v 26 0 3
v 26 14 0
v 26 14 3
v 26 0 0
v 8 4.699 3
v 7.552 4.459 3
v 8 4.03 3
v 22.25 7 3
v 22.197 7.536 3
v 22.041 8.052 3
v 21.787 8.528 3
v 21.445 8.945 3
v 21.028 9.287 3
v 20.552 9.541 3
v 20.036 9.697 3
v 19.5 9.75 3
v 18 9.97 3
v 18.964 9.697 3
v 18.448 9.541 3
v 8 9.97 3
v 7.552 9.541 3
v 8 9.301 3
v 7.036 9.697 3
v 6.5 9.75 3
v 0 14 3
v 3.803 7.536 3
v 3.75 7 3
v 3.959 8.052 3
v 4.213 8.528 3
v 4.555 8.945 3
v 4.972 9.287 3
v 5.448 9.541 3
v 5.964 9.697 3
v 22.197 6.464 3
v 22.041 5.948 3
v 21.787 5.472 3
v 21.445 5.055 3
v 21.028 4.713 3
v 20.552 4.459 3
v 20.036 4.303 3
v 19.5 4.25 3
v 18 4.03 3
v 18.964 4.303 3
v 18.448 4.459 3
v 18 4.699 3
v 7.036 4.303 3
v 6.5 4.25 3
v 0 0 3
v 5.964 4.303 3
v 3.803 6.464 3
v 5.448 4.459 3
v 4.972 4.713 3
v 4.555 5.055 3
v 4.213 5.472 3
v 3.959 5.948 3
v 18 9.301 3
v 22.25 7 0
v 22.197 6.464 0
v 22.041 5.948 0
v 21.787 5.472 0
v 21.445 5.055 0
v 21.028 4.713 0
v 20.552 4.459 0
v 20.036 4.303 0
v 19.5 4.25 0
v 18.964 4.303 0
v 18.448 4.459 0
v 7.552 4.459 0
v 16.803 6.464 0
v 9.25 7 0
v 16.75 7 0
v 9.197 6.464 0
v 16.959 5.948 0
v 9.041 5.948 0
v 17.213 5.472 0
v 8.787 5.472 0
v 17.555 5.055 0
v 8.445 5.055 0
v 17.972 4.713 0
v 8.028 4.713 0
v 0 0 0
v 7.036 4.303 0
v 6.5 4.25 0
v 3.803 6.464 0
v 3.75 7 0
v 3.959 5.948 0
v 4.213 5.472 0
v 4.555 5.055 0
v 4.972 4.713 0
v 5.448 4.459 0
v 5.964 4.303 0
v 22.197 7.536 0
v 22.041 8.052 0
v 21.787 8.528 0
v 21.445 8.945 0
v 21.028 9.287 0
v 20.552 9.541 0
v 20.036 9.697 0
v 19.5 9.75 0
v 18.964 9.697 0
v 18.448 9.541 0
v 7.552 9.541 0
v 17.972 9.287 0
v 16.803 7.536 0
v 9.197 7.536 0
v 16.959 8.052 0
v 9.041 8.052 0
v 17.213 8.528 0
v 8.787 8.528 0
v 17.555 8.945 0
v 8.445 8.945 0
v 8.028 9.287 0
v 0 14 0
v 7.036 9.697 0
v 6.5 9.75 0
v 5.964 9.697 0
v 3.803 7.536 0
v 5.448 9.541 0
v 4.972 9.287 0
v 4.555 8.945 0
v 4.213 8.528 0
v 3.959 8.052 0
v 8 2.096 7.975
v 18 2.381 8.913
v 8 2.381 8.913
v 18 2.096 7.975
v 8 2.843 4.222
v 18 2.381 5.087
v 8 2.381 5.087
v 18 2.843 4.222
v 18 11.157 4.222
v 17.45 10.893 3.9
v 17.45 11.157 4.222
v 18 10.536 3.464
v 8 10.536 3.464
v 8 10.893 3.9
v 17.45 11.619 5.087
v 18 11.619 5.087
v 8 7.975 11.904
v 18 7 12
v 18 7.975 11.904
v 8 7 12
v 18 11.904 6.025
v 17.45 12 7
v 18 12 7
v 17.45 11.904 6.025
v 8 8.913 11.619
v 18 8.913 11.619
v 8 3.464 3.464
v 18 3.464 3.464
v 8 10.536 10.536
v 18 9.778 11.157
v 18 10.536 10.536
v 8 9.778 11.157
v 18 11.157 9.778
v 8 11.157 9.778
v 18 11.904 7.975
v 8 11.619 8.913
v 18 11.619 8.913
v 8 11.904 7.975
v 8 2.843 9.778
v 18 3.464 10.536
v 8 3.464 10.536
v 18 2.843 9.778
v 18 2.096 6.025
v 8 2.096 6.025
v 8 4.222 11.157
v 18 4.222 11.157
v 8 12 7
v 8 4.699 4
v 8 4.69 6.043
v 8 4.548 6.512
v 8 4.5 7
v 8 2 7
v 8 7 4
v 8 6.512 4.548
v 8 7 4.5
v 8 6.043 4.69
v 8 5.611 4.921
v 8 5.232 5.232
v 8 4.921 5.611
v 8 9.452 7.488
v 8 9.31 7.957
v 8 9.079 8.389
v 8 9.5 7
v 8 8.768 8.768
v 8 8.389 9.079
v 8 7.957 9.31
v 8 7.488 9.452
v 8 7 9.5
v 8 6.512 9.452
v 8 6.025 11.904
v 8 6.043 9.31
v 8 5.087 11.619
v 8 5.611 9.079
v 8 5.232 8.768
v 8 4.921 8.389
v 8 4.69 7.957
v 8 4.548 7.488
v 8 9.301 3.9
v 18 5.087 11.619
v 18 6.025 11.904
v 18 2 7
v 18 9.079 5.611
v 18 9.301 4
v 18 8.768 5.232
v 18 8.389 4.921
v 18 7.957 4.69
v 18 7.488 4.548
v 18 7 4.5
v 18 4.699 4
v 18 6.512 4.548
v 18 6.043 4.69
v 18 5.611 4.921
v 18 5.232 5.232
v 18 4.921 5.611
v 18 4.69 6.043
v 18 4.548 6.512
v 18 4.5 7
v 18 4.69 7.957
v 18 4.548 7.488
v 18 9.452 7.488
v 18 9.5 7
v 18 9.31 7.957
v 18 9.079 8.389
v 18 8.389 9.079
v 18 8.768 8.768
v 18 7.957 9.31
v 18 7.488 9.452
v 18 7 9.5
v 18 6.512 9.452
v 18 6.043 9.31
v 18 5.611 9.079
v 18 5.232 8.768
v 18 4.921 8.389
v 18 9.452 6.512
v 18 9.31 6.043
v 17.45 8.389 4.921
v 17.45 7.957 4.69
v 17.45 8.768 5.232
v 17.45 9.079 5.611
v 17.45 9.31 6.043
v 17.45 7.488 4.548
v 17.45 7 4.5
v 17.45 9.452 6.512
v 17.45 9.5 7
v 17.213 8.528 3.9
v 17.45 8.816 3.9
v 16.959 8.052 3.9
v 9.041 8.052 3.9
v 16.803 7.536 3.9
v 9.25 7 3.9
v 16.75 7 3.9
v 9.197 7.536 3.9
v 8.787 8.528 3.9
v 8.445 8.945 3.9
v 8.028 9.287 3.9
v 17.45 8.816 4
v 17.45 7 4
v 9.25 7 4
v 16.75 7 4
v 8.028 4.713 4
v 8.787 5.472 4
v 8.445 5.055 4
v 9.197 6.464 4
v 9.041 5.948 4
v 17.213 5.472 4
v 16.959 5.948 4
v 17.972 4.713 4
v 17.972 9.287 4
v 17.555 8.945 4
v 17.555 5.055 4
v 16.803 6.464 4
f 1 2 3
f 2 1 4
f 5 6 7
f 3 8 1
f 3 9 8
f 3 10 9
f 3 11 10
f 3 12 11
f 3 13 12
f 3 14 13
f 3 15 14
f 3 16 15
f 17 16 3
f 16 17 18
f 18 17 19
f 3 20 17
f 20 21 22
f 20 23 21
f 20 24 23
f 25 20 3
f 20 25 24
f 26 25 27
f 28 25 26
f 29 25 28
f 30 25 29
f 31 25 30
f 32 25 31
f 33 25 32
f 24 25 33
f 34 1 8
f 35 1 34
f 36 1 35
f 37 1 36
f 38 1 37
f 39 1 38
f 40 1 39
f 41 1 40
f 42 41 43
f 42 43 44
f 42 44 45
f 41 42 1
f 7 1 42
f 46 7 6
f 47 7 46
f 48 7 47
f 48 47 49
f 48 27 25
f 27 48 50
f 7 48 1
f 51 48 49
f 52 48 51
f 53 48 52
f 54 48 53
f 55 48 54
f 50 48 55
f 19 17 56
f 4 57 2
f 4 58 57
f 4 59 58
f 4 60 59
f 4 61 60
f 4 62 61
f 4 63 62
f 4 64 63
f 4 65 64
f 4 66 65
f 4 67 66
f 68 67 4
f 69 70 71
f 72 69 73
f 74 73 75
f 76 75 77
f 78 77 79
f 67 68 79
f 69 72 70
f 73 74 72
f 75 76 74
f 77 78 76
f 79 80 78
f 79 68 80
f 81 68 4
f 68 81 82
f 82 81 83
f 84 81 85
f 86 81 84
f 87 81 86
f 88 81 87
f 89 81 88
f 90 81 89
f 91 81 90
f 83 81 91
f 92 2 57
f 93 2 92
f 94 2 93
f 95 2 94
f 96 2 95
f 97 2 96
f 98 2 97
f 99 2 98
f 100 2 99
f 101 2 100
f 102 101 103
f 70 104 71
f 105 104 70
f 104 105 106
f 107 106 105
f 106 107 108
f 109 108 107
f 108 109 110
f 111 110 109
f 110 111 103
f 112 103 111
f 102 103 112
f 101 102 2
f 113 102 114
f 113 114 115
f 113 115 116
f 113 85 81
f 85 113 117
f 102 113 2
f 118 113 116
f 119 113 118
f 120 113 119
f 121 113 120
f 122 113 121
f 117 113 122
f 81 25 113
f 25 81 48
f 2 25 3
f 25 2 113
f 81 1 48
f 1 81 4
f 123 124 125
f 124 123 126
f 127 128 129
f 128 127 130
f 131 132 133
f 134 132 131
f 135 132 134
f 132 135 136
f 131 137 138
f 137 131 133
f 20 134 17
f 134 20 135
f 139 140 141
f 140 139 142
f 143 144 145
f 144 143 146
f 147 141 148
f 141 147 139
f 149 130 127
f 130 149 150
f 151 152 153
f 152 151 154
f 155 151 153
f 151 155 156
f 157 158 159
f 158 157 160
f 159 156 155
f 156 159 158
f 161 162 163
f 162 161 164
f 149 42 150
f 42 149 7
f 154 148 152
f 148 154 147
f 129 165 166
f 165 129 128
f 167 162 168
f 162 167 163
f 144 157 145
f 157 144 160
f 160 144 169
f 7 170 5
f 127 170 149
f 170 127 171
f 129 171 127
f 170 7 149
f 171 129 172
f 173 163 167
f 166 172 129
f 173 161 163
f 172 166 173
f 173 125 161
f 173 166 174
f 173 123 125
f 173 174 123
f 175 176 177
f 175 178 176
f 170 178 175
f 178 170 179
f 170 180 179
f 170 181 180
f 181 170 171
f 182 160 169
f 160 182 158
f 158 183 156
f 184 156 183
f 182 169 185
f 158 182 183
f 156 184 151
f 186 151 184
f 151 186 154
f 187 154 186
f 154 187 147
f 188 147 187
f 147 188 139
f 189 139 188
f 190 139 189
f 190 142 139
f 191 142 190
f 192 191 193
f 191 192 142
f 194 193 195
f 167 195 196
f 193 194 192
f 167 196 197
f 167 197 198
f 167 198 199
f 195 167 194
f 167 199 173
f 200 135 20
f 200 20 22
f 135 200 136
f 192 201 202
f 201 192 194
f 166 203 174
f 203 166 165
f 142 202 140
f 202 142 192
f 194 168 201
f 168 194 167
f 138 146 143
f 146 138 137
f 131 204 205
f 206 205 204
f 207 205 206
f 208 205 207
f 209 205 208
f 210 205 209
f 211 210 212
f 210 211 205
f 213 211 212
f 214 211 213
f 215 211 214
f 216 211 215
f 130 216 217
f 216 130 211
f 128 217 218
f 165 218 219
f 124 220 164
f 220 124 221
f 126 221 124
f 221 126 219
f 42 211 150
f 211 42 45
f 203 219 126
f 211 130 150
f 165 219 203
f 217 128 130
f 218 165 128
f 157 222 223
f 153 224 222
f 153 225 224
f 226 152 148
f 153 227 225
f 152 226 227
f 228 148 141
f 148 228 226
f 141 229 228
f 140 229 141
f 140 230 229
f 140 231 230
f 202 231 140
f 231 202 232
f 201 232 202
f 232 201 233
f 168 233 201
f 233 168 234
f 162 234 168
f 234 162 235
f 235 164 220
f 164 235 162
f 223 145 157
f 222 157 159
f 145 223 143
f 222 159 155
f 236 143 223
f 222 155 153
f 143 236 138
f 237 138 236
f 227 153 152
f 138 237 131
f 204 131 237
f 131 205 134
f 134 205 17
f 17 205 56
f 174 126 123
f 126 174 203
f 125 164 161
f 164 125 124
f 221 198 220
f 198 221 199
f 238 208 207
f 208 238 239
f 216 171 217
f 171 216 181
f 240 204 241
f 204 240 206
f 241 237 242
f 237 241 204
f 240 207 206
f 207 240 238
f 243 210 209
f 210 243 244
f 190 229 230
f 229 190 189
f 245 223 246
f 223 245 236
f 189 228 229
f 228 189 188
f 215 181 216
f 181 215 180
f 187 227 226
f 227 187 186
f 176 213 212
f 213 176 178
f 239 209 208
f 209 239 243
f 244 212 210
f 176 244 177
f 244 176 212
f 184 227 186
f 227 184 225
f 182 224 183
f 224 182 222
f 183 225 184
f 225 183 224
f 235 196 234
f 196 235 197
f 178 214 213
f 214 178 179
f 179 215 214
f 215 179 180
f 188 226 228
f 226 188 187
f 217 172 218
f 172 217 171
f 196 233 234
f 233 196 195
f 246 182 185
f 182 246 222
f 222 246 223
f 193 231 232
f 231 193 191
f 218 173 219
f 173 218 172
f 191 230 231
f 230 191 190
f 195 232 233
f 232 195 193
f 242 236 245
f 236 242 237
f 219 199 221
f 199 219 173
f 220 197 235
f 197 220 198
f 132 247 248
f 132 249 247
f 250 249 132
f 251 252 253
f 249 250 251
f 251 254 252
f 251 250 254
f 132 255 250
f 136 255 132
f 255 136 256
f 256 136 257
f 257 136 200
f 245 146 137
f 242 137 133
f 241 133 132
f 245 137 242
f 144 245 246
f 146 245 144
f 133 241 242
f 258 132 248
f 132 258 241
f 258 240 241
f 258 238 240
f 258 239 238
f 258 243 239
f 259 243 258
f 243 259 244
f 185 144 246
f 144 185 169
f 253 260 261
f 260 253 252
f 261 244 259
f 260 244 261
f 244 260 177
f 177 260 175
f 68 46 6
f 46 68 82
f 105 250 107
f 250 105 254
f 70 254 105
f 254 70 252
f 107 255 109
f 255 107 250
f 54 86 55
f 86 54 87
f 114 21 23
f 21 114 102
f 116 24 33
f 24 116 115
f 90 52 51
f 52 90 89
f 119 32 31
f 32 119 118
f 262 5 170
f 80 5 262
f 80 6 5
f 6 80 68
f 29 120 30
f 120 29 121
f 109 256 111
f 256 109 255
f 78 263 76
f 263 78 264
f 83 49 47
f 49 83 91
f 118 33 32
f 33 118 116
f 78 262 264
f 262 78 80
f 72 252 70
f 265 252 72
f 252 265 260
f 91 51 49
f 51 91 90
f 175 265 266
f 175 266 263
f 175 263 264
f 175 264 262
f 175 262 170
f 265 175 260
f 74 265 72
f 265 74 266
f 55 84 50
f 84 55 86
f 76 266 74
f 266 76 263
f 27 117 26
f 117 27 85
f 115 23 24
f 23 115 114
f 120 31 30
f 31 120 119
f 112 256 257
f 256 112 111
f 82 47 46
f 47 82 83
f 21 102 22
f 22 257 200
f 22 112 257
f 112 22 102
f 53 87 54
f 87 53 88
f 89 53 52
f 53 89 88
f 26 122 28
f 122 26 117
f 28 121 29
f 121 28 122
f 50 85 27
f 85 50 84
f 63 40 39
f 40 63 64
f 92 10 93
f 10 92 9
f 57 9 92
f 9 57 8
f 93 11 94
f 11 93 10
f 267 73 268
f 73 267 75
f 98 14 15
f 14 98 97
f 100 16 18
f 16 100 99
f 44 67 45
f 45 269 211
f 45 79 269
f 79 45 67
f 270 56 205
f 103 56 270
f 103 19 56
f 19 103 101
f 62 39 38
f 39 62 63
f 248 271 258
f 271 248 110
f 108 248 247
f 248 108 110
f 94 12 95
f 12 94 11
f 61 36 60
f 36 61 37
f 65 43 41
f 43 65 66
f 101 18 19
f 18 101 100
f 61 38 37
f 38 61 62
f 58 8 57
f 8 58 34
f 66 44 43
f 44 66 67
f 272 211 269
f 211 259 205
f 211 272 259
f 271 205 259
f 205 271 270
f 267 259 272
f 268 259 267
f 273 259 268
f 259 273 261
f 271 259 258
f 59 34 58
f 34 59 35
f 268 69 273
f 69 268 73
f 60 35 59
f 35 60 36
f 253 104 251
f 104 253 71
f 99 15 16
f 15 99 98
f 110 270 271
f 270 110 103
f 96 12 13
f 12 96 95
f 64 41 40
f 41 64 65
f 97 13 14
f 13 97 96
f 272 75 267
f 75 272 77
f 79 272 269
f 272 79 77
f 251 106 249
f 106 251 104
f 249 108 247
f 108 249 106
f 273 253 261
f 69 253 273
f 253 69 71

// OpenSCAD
$fn = 32;

// ----------------------------------------------------------------------
// Cable clip: cable 5 mm, clamp 10 mm, base 26 mm
// ----------------------------------------------------------------------

// --- parameters (mm) ---
base_w = 26;              // base length, X
base_d = 14;              // base width, Y
base_t = 3;               // base thickness
clamp_d = 10;             // clamp outside diameter
wall_t = 2.5;             // clamp wall
cable_d = 5;              // cable opening
ring_w = 10;              // clamp width along the cable
screw_d = 5.5;            // screw clearance
throat = 3.1;             // snap throat width
sink = 1;                 // overlap of the clamp into the base

module base() {
  cube([base_w, base_d, base_t]);
}

module clamp() {
  translate([base_w / 2, base_d / 2, base_t + clamp_d / 2 - sink]) rotate([0, 90, 0])
    cylinder(h = ring_w, d = clamp_d, center = true);
}

difference() {
  union() {
    base();
    clamp();
  }
  translate([base_w / 2, base_d / 2, base_t + clamp_d / 2 - sink]) rotate([0, 90, 0]) translate([0, 0, -ring_w / 2 - 1]) cylinder(h = ring_w + 2, d = cable_d);
  /* snap throat: the opening is narrower than the cable */
  translate([base_w / 2 - throat / 2, base_d / 2, base_t + clamp_d / 2 - sink]) rotate([0, 90, 0]) translate([0, 0, -ring_w / 2 - 1]) cube([throat, clamp_d + 2, ring_w + 2]);
  translate([6.5, base_d / 2, -1]) cylinder(h = base_t + 2, d = screw_d);
  translate([19.5, base_d / 2, -1]) cylinder(h = base_t + 2, d = screw_d);
}
